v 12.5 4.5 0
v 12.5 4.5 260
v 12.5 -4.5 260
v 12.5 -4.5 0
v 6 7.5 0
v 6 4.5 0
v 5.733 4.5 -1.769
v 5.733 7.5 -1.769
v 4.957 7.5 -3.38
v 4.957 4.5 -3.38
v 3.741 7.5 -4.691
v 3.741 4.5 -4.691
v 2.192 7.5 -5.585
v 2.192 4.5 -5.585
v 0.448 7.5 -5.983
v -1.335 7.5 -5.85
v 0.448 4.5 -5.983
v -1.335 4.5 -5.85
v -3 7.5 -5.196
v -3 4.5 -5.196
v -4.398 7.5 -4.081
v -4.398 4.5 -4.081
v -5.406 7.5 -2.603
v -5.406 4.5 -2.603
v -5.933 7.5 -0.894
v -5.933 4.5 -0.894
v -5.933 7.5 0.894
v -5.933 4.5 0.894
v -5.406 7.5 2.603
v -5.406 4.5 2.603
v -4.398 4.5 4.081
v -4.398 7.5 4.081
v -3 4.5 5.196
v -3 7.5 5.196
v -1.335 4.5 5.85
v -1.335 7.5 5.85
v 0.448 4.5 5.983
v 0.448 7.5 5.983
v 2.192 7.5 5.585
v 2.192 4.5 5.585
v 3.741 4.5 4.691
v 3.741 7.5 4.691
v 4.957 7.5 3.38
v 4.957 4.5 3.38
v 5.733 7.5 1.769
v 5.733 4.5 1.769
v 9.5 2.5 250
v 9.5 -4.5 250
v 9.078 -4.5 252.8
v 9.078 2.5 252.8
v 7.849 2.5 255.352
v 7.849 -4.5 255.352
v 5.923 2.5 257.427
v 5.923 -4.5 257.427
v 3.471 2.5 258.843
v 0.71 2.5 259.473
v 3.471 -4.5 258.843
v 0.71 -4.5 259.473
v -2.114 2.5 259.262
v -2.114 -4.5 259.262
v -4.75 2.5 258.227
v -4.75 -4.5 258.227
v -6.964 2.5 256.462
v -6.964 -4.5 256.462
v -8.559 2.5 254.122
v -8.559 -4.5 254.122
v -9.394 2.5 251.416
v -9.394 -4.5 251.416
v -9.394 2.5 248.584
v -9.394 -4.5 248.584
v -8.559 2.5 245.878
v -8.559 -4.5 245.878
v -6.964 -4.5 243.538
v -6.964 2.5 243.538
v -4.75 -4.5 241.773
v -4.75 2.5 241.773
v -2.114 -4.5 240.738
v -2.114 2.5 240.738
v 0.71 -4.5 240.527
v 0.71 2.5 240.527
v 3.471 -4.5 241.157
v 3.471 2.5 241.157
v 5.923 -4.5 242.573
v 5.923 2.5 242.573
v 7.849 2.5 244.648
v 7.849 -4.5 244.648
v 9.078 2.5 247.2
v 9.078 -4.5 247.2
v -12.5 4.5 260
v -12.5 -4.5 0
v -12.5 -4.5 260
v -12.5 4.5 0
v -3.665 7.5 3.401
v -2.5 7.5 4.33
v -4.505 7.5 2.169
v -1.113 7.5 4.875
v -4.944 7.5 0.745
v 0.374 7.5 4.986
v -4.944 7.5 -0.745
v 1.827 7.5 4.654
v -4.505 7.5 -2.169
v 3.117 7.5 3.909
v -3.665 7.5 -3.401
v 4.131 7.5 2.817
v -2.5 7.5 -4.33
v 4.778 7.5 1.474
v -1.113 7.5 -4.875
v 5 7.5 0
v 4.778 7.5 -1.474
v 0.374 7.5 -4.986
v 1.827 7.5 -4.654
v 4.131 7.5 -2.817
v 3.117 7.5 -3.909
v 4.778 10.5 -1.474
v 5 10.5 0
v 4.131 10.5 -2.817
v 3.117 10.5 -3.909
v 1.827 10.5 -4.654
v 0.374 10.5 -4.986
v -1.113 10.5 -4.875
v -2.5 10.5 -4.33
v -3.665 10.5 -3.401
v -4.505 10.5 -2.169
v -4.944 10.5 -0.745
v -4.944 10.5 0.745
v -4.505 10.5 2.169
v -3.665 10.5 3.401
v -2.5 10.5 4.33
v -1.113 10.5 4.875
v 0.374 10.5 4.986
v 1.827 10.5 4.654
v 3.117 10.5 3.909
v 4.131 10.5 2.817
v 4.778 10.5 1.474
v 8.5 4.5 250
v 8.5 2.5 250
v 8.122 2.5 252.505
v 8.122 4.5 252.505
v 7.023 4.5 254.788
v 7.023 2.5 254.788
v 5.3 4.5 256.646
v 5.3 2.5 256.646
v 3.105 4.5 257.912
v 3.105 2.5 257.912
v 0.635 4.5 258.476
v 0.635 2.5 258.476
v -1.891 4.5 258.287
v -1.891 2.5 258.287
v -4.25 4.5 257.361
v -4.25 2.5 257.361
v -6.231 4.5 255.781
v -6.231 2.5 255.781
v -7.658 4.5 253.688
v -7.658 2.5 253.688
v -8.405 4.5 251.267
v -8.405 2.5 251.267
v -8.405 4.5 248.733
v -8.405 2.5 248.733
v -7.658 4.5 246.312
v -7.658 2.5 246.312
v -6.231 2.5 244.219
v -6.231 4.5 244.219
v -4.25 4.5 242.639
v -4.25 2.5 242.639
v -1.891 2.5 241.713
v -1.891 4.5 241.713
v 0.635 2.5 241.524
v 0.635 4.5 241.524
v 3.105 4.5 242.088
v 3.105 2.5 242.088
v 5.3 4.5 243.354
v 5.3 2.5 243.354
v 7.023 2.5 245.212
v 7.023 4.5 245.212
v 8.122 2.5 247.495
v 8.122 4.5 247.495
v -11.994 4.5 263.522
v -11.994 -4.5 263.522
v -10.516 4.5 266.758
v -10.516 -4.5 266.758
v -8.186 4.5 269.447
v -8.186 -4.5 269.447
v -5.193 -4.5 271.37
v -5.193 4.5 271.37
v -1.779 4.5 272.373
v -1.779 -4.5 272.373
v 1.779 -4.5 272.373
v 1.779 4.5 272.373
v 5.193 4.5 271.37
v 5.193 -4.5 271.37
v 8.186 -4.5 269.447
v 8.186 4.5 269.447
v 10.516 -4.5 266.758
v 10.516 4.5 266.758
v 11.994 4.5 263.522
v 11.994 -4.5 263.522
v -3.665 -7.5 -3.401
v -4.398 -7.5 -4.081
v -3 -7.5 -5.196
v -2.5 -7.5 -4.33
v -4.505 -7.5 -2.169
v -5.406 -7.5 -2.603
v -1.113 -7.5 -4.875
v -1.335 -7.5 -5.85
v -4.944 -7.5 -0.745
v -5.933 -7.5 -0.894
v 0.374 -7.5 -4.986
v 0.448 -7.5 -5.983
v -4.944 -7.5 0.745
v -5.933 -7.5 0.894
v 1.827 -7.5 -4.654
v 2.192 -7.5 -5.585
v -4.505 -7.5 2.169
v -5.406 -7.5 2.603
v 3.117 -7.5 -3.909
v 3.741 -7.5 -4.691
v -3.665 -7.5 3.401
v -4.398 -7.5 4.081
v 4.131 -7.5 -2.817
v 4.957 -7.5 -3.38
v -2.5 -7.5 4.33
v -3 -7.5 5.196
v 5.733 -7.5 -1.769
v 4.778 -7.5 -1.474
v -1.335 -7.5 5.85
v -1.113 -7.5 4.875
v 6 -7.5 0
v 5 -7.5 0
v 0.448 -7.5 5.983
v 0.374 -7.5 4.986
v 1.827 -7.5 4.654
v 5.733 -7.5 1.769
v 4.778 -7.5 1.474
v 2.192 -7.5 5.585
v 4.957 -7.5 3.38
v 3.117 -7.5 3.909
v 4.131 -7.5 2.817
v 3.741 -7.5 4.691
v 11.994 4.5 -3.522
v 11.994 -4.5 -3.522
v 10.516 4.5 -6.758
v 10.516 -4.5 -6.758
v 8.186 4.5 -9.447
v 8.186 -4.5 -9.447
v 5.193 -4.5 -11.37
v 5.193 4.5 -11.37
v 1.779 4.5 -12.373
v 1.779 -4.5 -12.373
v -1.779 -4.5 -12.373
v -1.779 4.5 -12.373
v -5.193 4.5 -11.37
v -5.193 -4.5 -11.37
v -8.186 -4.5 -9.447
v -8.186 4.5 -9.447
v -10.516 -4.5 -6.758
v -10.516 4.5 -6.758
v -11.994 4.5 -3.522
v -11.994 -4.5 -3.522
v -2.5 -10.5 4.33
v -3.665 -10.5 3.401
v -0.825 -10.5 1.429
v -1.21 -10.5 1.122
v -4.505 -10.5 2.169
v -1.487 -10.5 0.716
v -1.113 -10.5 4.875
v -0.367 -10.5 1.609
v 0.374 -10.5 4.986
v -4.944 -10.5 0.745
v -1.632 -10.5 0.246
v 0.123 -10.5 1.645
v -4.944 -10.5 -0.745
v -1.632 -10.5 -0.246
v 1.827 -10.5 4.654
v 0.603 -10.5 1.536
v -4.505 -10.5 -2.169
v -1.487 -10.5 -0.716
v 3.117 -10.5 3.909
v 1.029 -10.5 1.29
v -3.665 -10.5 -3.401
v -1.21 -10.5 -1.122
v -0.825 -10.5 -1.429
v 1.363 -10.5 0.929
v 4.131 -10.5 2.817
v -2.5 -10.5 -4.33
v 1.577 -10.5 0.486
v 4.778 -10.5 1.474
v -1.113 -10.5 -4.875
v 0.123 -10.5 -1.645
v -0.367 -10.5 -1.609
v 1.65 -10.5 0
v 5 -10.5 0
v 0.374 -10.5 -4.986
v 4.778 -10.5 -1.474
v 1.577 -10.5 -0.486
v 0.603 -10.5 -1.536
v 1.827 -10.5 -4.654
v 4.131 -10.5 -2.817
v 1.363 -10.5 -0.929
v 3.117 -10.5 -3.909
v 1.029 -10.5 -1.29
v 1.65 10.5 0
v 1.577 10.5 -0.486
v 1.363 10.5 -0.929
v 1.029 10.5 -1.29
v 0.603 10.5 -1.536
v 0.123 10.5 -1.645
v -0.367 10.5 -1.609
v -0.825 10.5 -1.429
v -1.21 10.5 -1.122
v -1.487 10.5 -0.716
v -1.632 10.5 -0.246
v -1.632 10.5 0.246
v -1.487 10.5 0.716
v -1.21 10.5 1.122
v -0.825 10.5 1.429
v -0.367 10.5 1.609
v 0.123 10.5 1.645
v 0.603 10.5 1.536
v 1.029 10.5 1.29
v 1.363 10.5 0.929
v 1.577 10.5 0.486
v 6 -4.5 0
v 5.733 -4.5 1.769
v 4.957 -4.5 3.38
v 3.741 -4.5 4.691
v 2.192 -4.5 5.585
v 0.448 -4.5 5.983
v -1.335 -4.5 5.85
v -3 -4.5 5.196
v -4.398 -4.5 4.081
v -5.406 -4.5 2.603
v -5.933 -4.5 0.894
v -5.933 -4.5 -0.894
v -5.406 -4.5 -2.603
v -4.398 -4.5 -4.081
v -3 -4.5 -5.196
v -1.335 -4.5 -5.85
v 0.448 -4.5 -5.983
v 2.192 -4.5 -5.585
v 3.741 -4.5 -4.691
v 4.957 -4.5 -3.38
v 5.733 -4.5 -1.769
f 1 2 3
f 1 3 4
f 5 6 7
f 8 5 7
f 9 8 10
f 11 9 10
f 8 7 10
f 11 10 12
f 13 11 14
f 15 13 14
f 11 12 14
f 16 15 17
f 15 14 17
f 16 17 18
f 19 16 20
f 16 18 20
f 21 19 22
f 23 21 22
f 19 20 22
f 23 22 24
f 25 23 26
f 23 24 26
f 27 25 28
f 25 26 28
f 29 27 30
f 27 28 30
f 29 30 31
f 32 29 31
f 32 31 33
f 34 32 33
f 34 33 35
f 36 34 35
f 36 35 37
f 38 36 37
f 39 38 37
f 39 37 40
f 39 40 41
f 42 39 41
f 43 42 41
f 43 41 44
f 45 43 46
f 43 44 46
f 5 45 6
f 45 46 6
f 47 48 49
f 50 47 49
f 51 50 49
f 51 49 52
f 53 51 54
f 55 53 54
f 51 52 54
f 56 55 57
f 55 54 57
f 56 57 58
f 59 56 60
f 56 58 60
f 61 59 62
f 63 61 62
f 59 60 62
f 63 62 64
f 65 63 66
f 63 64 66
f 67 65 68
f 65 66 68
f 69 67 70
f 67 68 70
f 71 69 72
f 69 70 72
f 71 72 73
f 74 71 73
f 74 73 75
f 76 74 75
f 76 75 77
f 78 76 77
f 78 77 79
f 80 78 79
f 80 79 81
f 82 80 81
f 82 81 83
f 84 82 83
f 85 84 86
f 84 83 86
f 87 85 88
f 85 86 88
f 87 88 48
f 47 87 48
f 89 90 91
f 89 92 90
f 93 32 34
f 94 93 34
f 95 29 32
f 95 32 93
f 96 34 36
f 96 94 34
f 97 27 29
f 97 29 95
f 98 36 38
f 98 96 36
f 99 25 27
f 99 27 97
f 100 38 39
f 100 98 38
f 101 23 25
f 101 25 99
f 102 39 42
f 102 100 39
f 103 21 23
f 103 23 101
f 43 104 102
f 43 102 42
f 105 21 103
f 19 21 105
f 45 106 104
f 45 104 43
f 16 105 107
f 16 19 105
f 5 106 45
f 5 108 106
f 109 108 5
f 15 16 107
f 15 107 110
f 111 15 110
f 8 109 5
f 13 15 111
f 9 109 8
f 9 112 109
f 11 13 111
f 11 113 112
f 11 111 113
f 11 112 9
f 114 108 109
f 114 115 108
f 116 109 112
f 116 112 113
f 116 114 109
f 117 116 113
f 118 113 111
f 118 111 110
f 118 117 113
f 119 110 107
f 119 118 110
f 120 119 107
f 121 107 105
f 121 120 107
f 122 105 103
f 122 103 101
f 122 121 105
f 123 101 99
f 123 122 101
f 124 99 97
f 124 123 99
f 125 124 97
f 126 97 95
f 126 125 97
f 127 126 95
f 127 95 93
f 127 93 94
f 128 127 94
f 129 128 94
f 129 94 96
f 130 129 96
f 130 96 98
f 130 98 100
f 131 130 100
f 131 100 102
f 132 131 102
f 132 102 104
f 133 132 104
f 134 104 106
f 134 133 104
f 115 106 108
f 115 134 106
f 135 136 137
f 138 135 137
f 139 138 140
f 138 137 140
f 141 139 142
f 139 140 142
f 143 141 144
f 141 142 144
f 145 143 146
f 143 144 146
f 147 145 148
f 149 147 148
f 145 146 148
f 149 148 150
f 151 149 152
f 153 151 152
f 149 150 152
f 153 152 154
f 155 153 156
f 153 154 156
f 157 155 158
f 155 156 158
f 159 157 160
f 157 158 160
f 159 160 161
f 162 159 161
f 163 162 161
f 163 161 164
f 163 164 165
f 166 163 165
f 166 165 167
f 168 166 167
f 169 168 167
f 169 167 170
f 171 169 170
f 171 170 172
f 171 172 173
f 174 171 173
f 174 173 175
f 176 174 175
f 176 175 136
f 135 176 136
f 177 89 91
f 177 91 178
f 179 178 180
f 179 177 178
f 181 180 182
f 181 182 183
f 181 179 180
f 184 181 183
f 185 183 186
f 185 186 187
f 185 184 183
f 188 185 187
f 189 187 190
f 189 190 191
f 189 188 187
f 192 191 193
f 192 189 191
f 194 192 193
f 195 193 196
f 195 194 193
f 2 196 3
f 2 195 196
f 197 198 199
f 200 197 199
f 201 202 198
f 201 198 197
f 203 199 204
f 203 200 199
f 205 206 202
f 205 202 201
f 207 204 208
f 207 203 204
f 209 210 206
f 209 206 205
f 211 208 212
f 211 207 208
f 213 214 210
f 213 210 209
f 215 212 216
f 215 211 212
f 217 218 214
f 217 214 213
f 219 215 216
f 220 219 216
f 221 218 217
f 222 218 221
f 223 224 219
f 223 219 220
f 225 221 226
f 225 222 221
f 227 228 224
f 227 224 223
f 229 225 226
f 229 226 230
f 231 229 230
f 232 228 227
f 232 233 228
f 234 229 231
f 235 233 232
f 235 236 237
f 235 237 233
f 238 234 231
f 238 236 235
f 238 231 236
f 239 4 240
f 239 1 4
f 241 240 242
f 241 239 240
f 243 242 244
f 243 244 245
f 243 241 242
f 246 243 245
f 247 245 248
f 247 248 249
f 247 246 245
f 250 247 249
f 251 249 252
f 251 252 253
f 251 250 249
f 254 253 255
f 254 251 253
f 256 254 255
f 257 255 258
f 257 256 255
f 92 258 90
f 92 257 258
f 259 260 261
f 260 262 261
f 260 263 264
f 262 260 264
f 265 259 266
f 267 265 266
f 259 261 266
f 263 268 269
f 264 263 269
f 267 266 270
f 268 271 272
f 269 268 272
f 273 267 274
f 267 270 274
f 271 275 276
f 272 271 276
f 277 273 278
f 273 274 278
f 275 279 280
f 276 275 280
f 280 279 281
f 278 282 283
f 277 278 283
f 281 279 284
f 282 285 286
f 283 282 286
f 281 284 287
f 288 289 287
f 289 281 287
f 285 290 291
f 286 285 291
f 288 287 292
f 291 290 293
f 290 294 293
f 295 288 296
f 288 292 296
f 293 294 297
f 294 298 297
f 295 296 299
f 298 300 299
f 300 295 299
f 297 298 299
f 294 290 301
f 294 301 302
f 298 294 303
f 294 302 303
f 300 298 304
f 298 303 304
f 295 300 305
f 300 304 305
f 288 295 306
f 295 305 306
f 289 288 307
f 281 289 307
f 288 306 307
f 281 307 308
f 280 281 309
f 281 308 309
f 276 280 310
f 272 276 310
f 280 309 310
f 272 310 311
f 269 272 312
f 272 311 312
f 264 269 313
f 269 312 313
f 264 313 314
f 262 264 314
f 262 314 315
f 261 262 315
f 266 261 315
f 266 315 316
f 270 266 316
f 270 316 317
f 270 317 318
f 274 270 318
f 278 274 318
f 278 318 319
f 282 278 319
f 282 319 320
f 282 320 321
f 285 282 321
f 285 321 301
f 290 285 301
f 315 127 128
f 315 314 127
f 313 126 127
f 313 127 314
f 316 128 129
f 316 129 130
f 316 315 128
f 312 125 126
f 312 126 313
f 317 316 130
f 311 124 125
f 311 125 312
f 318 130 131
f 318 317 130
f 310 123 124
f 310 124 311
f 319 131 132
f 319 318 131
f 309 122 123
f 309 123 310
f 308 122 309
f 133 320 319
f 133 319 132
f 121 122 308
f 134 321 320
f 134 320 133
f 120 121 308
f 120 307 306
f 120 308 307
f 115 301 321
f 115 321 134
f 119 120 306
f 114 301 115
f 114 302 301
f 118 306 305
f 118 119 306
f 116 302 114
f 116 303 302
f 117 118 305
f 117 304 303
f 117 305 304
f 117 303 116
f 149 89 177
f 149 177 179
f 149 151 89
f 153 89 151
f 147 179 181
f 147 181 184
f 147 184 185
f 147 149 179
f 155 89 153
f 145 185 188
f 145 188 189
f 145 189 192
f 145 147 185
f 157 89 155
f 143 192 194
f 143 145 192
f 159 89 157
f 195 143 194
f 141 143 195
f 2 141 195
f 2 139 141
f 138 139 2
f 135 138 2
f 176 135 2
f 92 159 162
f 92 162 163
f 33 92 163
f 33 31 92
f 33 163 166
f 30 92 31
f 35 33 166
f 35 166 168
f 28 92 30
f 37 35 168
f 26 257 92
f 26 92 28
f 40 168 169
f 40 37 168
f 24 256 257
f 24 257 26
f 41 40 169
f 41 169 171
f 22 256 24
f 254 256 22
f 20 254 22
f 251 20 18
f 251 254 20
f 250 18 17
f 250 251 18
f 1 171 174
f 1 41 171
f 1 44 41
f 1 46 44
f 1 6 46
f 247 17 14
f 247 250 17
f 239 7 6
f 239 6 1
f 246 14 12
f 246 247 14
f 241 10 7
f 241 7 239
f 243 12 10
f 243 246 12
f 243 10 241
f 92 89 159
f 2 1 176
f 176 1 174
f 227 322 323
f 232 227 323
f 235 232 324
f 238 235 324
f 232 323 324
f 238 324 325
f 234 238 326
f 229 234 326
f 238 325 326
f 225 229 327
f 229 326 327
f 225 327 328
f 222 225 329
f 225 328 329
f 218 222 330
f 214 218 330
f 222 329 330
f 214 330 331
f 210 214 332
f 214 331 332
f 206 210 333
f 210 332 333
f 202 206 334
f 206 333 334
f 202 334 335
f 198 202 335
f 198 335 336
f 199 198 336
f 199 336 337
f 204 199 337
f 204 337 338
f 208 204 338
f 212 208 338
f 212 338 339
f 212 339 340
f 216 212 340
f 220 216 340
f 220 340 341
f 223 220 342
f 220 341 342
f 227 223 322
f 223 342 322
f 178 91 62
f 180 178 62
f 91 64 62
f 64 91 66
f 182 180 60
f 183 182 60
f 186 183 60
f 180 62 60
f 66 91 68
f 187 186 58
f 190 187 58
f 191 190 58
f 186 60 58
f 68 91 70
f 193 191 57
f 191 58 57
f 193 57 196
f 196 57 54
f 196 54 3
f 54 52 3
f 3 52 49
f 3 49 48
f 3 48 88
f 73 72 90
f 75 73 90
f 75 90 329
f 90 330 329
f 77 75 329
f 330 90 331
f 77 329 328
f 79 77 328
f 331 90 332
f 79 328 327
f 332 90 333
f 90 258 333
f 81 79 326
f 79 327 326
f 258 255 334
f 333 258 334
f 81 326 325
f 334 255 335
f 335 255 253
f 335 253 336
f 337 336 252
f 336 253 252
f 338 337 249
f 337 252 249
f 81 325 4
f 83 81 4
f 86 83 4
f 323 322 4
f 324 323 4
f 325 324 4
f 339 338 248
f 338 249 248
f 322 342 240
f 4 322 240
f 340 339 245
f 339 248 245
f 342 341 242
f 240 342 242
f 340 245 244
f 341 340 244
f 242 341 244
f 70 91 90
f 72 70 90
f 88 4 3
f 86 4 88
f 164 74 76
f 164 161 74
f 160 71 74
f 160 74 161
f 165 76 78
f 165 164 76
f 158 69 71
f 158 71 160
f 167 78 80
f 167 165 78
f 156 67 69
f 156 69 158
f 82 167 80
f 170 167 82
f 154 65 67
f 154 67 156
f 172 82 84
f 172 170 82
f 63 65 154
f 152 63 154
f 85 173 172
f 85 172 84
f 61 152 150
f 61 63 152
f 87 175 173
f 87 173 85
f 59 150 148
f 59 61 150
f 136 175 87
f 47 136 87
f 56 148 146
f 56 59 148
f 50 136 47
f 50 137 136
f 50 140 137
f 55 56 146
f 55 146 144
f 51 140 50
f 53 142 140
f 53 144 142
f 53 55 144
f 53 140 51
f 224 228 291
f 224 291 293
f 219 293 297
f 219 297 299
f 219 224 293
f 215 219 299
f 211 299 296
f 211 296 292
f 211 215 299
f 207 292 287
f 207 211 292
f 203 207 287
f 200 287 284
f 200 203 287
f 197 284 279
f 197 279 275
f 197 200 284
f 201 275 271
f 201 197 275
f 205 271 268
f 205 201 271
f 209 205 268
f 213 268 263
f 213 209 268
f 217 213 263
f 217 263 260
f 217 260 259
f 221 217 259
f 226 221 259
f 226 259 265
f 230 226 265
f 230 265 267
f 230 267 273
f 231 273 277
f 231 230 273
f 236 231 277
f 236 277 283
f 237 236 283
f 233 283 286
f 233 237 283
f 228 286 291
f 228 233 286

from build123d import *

# Parameters (mm, degrees)
EXTRUDE_1_DEPTH      = 10.5
EXTRUDE_1_DEPTH_BACK = 10.5
SKETCH_1_R           = 5
EXTRUDE_3_DEPTH      = 4.5
EXTRUDE_3_DEPTH_BACK = 4.5
SKETCH_7_R           = 6
EXTRUDE_4_DEPTH      = 3
EXTRUDE_START        = 3
SKETCH_8_R           = 6
EXTRUDE_5_DEPTH      = 3
SKETCH_9_R           = 9.5
CUT_EXTRUDE_1_DEPTH  = 7
SKETCH_10_R          = 8.5
CUT_EXTRUDE_2_DEPTH  = 274.096136919
HOLE_WIZARD_M4_1_D   = 3.3


with BuildPart() as part:
    # 스케치1 → 보스-돌출1 (new, two sides: drawn at the far end of the back side and taken through both)
    with BuildSketch(Plane(origin=(0, 0, 0), x_dir=(1, 0, 0), z_dir=(0, 1, 0)).offset(-EXTRUDE_1_DEPTH_BACK)):
        Circle(SKETCH_1_R)
    extrude(amount=EXTRUDE_1_DEPTH + EXTRUDE_1_DEPTH_BACK)

    # 스케치6 → 보스-돌출3 (add, two sides: drawn at the far end of the back side and taken through both)
    with BuildSketch(Plane(origin=(0, 0, 0), x_dir=(1, 0, 0), z_dir=(0, 1, 0)).offset(-EXTRUDE_3_DEPTH_BACK)):
        with BuildLine():
            Line((-12.5, 0), (-12.5, -260))
            ThreePointArc((-12.5, -260), (0, -272.5), (12.5, -260))
            Line((12.5, -260), (12.5, 0))
            ThreePointArc((12.5, 0), (0, 12.5), (-12.5, 0))
        make_face()
    extrude(amount=EXTRUDE_3_DEPTH + EXTRUDE_3_DEPTH_BACK)

    # 스케치7 → 보스-돌출4 (add)
    with BuildSketch(Plane.XZ.offset(4.5)):
        Circle(SKETCH_7_R)
    extrude(amount=EXTRUDE_4_DEPTH)

    # 스케치8 → 보스-돌출5 (add)
    with BuildSketch(Plane(origin=(0, 4.5, 0), x_dir=(1, 0, 0), z_dir=(0, 1, 0)).offset(EXTRUDE_START)):
        Circle(SKETCH_8_R)
    extrude(amount=-EXTRUDE_5_DEPTH)

    # 스케치9 → 컷-돌출1 (cut)
    with BuildSketch(Plane.XZ.offset(4.5)):
        with Locations((0, 250)):
            Circle(SKETCH_9_R)
    extrude(amount=-CUT_EXTRUDE_1_DEPTH, mode=Mode.SUBTRACT)

    # 스케치10 → 컷-돌출2 (cut, through all)
    with BuildSketch(Plane.XZ.offset(-2.5)):
        with Locations((0, 250)):
            Circle(SKETCH_10_R)
    extrude(amount=-CUT_EXTRUDE_2_DEPTH, mode=Mode.SUBTRACT)

    # M4 탭을 위한 탭 드릴1 (through all)
    with Locations(Plane(origin=(0, -10.5, 0), x_dir=(-1, 0, 0), z_dir=(0, -1, 0))):
        with Locations((0, 0)):
            Hole(HOLE_WIZARD_M4_1_D / 2)


solid = part.part
